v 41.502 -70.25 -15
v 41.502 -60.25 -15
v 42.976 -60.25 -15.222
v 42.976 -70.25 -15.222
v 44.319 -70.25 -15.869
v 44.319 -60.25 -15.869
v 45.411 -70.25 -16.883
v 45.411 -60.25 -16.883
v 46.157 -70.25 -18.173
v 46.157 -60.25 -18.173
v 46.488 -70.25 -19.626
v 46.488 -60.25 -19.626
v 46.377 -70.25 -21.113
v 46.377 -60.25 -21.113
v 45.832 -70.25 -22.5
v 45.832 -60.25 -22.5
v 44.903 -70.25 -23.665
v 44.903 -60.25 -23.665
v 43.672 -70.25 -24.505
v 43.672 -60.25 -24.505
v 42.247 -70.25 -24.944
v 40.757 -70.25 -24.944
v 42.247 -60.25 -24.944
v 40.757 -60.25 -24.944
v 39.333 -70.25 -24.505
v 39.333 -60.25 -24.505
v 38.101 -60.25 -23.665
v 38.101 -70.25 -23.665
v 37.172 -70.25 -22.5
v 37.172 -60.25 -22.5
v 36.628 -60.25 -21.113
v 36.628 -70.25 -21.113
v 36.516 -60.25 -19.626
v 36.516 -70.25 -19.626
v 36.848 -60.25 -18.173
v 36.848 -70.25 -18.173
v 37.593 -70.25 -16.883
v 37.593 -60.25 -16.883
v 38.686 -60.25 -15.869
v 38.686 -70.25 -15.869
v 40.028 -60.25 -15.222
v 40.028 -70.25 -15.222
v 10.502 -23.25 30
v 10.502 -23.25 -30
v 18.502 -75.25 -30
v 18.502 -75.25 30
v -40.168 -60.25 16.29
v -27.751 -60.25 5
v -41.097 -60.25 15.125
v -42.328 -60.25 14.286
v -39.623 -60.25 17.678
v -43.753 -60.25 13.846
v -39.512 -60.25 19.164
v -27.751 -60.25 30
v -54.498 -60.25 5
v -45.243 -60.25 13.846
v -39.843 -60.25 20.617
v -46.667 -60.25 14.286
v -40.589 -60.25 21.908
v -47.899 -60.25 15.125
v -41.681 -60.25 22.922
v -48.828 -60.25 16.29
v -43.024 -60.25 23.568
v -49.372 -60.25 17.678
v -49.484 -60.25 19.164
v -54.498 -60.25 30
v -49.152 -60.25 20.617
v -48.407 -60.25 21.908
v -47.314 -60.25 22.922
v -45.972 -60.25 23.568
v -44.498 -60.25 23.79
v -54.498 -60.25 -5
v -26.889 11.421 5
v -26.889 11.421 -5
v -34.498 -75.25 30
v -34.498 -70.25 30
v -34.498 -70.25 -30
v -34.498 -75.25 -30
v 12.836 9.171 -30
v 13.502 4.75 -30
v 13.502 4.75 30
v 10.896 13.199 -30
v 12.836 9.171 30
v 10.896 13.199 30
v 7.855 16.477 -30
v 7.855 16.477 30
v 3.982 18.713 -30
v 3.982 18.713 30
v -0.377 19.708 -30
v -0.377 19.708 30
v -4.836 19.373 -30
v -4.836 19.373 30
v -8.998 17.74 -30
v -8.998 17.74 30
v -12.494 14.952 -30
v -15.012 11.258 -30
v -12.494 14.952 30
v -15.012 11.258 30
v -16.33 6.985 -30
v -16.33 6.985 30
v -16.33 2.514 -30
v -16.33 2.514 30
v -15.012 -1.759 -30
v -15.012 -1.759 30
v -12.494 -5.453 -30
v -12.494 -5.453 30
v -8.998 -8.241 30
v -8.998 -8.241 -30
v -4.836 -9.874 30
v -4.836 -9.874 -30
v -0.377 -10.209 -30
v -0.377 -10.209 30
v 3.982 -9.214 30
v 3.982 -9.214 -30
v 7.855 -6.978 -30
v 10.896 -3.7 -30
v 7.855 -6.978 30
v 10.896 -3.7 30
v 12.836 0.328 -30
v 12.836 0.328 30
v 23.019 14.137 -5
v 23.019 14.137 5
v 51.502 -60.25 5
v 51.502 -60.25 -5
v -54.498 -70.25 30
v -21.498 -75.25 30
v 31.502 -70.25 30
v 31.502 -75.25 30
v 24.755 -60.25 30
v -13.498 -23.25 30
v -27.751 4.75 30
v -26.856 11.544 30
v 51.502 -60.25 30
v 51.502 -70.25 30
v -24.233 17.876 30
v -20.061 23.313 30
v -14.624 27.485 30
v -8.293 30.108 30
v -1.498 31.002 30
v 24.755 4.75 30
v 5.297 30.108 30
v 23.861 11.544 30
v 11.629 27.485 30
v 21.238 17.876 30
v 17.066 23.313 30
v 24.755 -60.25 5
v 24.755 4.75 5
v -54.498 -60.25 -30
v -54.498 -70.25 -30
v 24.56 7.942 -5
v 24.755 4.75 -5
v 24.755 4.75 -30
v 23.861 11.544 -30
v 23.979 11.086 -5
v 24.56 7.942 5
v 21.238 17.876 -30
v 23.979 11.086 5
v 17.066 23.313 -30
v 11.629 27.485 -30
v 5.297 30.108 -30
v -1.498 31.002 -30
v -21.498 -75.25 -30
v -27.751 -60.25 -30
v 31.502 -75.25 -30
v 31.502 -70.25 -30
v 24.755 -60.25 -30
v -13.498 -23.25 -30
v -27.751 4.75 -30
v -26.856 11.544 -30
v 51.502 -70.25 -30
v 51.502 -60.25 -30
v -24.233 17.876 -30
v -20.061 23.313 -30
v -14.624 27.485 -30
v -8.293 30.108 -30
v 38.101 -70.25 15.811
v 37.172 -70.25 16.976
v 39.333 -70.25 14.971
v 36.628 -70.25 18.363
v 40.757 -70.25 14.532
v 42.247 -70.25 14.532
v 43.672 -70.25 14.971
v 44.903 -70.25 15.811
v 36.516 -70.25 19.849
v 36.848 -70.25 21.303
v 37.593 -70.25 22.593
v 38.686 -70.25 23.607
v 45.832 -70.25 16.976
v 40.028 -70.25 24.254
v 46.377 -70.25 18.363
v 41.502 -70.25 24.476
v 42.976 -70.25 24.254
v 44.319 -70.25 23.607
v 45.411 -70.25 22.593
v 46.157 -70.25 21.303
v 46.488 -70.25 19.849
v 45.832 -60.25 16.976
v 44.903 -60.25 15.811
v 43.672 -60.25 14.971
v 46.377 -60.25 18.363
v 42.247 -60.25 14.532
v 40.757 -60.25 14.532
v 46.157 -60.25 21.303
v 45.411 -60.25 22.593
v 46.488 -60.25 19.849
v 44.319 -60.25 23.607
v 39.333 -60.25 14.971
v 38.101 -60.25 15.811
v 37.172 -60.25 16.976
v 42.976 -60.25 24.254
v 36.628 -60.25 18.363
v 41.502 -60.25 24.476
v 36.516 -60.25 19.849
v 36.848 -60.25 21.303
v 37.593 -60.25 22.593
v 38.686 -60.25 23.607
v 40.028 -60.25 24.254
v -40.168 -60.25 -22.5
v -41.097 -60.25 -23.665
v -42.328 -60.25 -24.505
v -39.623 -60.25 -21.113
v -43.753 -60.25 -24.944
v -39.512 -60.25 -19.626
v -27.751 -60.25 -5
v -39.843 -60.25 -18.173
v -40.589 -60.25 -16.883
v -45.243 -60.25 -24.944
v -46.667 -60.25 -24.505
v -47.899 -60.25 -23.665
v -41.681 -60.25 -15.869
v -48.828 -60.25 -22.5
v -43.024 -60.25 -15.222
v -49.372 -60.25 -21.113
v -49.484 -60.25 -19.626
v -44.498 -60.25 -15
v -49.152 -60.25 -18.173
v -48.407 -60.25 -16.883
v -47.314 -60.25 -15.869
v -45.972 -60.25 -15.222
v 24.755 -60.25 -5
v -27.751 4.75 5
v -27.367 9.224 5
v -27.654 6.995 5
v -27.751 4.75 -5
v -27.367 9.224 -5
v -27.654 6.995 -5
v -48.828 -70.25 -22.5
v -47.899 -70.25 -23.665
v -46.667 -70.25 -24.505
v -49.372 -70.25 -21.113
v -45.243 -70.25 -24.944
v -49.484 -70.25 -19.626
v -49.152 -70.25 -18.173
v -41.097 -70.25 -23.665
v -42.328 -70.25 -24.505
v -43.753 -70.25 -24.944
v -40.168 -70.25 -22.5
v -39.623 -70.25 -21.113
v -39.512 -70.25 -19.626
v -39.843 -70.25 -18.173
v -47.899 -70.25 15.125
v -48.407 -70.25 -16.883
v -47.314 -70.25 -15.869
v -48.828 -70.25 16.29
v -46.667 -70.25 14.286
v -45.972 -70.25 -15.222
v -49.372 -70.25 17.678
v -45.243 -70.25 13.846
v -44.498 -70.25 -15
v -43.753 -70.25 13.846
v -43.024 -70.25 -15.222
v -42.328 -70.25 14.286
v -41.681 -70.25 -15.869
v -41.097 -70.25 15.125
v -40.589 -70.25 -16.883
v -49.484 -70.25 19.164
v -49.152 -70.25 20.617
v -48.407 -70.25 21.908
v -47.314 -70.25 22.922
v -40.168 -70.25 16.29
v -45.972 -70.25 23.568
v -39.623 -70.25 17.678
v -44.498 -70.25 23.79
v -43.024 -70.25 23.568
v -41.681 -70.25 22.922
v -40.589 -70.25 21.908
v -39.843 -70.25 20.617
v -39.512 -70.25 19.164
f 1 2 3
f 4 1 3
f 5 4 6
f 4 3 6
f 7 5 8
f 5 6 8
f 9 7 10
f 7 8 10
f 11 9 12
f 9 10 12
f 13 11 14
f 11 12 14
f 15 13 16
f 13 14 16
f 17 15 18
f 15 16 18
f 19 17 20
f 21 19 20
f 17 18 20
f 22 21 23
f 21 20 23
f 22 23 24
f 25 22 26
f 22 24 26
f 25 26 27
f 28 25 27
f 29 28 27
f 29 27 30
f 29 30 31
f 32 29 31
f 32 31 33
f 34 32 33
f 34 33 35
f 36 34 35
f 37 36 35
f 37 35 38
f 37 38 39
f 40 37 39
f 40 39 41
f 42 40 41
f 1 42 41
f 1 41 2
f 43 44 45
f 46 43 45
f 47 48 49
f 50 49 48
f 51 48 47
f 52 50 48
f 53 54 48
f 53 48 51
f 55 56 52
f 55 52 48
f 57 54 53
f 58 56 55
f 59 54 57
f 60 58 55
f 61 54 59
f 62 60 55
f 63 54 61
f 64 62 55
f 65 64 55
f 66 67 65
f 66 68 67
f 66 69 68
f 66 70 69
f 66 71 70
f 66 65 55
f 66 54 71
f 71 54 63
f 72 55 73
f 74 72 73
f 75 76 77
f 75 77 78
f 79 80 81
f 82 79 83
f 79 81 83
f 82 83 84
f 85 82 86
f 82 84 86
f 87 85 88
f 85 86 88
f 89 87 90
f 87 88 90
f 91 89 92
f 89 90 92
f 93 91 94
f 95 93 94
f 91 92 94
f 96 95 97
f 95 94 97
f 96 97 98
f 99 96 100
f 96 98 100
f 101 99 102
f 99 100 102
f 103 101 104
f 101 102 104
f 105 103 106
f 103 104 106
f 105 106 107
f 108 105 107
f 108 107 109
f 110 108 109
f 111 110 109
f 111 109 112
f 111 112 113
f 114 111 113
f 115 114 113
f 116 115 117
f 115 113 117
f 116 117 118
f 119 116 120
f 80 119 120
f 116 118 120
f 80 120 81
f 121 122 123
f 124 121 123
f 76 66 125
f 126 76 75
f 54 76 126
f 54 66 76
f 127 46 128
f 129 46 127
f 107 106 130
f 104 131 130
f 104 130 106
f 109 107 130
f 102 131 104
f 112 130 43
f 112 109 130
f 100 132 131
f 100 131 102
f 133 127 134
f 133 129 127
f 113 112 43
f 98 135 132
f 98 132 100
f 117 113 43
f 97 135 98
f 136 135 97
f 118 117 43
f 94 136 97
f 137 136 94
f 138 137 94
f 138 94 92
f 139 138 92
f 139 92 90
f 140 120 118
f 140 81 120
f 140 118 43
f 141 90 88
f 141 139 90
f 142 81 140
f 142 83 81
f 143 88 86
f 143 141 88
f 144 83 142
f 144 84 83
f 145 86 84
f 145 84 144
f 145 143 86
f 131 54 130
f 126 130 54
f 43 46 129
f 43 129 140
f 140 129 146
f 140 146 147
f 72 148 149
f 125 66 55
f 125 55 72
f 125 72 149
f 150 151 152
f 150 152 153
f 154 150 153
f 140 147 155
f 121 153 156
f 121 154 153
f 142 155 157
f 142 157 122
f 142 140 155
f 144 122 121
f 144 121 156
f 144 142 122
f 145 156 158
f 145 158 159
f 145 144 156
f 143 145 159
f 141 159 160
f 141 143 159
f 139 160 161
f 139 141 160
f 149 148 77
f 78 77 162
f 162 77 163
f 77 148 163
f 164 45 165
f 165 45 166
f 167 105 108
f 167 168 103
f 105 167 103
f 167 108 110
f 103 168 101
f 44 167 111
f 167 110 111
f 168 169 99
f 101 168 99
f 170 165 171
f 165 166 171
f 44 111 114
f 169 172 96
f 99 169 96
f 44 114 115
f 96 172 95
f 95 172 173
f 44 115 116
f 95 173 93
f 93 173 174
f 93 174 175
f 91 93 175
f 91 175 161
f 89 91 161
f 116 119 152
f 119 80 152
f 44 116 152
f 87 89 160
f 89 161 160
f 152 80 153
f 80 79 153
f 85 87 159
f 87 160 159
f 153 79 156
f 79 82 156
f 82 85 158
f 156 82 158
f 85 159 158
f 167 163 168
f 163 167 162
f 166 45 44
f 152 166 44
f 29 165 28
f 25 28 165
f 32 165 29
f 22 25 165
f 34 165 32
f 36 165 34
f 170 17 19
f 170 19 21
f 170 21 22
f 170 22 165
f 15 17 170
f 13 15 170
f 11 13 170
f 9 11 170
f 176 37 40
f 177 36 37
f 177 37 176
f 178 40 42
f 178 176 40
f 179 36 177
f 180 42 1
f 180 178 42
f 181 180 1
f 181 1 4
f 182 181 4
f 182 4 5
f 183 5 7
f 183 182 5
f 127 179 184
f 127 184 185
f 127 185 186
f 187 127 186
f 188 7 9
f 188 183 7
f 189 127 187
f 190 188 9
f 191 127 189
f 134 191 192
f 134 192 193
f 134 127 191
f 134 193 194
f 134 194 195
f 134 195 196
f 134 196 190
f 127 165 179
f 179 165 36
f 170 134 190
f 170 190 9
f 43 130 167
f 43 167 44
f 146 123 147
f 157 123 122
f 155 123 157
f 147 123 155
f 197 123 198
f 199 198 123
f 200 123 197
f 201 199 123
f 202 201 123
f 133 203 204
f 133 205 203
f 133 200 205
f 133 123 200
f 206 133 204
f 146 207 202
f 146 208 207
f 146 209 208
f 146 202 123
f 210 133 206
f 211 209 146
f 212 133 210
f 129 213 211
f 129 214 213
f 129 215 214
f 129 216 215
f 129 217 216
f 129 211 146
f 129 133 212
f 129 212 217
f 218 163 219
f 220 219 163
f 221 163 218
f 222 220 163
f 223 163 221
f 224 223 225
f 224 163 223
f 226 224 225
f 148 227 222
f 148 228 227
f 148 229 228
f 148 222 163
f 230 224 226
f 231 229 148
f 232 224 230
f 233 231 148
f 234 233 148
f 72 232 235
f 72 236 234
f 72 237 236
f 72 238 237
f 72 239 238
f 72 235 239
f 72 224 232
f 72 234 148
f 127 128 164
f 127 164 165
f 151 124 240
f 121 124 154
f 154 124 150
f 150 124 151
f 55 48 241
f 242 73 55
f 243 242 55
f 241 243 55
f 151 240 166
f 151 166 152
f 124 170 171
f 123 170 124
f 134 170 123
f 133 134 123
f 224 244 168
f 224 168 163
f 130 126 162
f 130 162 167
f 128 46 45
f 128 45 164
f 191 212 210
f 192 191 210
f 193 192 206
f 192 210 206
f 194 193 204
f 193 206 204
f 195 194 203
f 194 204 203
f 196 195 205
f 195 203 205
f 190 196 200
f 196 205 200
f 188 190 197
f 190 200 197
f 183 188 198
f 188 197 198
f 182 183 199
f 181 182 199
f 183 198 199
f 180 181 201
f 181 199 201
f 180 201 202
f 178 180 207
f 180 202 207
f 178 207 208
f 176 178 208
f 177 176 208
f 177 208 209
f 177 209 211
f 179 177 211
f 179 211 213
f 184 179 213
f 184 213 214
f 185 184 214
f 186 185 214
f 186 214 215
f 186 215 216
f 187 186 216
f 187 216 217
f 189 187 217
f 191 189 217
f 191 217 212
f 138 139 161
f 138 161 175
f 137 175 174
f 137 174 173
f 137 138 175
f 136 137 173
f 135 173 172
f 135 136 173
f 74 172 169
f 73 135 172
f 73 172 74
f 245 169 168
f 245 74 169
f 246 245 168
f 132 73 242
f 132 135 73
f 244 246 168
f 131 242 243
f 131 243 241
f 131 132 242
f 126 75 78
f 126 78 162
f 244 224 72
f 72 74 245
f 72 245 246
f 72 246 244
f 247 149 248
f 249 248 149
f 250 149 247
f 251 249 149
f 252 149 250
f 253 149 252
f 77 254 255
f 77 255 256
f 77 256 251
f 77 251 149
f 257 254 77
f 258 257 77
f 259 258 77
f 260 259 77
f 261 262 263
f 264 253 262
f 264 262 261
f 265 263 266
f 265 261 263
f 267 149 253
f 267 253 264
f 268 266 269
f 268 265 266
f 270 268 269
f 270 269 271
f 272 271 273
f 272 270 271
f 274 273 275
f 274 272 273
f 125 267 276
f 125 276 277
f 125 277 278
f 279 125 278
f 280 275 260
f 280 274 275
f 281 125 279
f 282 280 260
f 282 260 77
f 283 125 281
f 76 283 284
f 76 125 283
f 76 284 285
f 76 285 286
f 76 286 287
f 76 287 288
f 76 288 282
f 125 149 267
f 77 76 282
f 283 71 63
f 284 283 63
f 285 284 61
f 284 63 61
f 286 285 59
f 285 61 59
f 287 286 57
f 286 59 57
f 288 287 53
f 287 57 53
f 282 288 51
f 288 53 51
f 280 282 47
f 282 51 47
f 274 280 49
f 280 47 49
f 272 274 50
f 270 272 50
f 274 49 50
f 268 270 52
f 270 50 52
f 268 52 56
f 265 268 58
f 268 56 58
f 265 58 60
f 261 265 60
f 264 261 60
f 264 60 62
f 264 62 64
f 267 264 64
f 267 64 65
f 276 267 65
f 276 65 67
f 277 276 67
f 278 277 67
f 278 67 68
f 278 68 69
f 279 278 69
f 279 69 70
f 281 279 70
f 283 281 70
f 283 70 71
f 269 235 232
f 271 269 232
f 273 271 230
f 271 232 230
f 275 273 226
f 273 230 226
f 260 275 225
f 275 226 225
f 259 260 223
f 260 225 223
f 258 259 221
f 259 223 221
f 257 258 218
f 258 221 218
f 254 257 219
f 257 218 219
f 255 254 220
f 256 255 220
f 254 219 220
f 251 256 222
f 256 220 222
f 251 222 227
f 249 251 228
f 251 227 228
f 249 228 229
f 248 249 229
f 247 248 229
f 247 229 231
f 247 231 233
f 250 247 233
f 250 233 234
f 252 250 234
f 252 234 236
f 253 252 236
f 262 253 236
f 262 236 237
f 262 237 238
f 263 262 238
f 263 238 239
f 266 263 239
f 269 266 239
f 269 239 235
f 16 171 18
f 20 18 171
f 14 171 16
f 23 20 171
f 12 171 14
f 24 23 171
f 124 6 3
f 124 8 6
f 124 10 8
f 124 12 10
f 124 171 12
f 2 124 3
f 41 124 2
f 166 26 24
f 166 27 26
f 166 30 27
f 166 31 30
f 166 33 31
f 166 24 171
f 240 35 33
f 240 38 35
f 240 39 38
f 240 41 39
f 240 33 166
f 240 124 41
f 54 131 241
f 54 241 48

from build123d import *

# Parameters (mm, degrees)
BOSS_EXTRUDE1_DEPTH = 60
SKETCH3_R           = 15
CUT_EXTRUDE1_DEPTH  = 60
SKETCH4_R           = 5
CUT_EXTRUDE2_DEPTH  = 60
BOSS_EXTRUDE2_DEPTH = 5
BOSS_EXTRUDE3_DEPTH = 5


with BuildPart() as part:
    # Sketch2 → Boss-Extrude1 (new body)
    with BuildSketch(Plane.XY):
        with BuildLine():
            ThreePointArc((-1.497772579, 31.002473484), (-20.061398623, 23.31316781), (-27.750704297, 4.749541766))
            Line((-27.750704297, 4.749541766), (-1.497772579, 4.749541766))
            Line((-1.497772579, 4.749541766), (-1.497772579, 31.002473484))
        make_face()
        with BuildLine():
            Line((-1.497772579, 4.749541766), (-27.750704297, 4.749541766))
            ThreePointArc((-27.750704297, 4.749541766), (-20.061398623, -13.814084278), (-1.497772579, -21.503389952))
            Line((-1.497772579, -21.503389952), (-1.497772579, 4.749541766))
        make_face()
        with BuildLine():
            Line((24.75515914, 4.749541766), (-1.497772579, 4.749541766))
            Line((-1.497772579, 4.749541766), (-1.497772579, -21.503389952))
            ThreePointArc((-1.497772579, -21.503389952), (17.065853465, -13.814084278), (24.75515914, 4.749541766))
        make_face()
        with BuildLine():
            Line((-1.497772579, 31.002473484), (-1.497772579, 4.749541766))
            Line((-1.497772579, 4.749541766), (24.75515914, 4.749541766))
            ThreePointArc((24.75515914, 4.749541766), (17.065853465, 23.31316781), (-1.497772579, 31.002473484))
        make_face()
        with BuildLine():
            ThreePointArc((-1.497772579, -21.503389952), (-20.061398623, -13.814084278), (-27.750704297, 4.749541766))
            Line((-27.750704297, 4.749541766), (-27.750704297, -60.250458234))
            Line((-27.750704297, -60.250458234), (-54.497772579, -60.250458234))
            Line((-54.497772579, -60.250458234), (-54.497772579, -70.250458234))
            Line((-54.497772579, -70.250458234), (-34.497772579, -70.250458234))
            Line((-34.497772579, -70.250458234), (-34.497772579, -75.250458234))
            Line((-34.497772579, -75.250458234), (-21.497772579, -75.250458234))
            Line((-21.497772579, -75.250458234), (-13.497772579, -23.250458234))
            Line((-13.497772579, -23.250458234), (10.502227421, -23.250458234))
            Line((10.502227421, -23.250458234), (18.502227421, -75.250458234))
            Line((18.502227421, -75.250458234), (31.502227421, -75.250458234))
            Line((31.502227421, -75.250458234), (31.502227421, -70.250458234))
            Line((31.502227421, -70.250458234), (51.502227421, -70.250458234))
            Line((51.502227421, -70.250458234), (51.502227421, -60.250458234))
            Line((51.502227421, -60.250458234), (24.75515914, -60.250458234))
            Line((24.75515914, -60.250458234), (24.75515914, 4.749541766))
            ThreePointArc((24.75515914, 4.749541766), (17.065853465, -13.814084278), (-1.497772579, -21.503389952))
        make_face()
    extrude(amount=-BOSS_EXTRUDE1_DEPTH)

    # Sketch3 → Cut-Extrude1 (cut)
    with BuildSketch(Plane.XY):
        with Locations((-1.497772579, 4.749541766)):
            Circle(SKETCH3_R)
    extrude(amount=-CUT_EXTRUDE1_DEPTH, mode=Mode.SUBTRACT)

    # Sketch4 → Cut-Extrude2 (cut)
    with BuildSketch(Plane(origin=(0, -60.250458234, 0), x_dir=(1, 0, 0), z_dir=(0, 1, 0))):
        with Locations(Location((41.502227421, 10.524161434, 0), (0, 0, 270))):
            Circle(SKETCH4_R)
        with Locations(Location((41.502227421, 50, 0), (0, 0, 270))):
            Circle(SKETCH4_R)
        with Locations(Location((-44.497772579, 50, 0), (0, 0, 270))):
            Circle(SKETCH4_R)
        with Locations(Location((-44.497772579, 11.209528187, 0), (0, 0, 270))):
            Circle(SKETCH4_R)
    extrude(amount=-CUT_EXTRUDE2_DEPTH, mode=Mode.SUBTRACT)


with BuildPart() as part_1:
    # Body-Move/Copy1: moved
    add(part.part.moved(Location((0, 0, 30))))

    # Sketch5 → Boss-Extrude2 (add, symmetric)
    with BuildSketch(Plane.XY):
        Polygon((23.019364547, 14.137108595), (51.502227421, -60.250458234), (24.75515914, -60.250458234), (23.019364547, -60.250458234), align=None)
    extrude(amount=BOSS_EXTRUDE2_DEPTH, both=True)

    # Sketch7 → Boss-Extrude3 (add, symmetric)
    with BuildSketch(Plane.XY):
        Polygon((-54.497772579, -60.250458234), (-26.888977339, 11.420609494), (-26.888977339, -60.250458234), align=None)
    extrude(amount=BOSS_EXTRUDE3_DEPTH, both=True)


solid = part_1.part
